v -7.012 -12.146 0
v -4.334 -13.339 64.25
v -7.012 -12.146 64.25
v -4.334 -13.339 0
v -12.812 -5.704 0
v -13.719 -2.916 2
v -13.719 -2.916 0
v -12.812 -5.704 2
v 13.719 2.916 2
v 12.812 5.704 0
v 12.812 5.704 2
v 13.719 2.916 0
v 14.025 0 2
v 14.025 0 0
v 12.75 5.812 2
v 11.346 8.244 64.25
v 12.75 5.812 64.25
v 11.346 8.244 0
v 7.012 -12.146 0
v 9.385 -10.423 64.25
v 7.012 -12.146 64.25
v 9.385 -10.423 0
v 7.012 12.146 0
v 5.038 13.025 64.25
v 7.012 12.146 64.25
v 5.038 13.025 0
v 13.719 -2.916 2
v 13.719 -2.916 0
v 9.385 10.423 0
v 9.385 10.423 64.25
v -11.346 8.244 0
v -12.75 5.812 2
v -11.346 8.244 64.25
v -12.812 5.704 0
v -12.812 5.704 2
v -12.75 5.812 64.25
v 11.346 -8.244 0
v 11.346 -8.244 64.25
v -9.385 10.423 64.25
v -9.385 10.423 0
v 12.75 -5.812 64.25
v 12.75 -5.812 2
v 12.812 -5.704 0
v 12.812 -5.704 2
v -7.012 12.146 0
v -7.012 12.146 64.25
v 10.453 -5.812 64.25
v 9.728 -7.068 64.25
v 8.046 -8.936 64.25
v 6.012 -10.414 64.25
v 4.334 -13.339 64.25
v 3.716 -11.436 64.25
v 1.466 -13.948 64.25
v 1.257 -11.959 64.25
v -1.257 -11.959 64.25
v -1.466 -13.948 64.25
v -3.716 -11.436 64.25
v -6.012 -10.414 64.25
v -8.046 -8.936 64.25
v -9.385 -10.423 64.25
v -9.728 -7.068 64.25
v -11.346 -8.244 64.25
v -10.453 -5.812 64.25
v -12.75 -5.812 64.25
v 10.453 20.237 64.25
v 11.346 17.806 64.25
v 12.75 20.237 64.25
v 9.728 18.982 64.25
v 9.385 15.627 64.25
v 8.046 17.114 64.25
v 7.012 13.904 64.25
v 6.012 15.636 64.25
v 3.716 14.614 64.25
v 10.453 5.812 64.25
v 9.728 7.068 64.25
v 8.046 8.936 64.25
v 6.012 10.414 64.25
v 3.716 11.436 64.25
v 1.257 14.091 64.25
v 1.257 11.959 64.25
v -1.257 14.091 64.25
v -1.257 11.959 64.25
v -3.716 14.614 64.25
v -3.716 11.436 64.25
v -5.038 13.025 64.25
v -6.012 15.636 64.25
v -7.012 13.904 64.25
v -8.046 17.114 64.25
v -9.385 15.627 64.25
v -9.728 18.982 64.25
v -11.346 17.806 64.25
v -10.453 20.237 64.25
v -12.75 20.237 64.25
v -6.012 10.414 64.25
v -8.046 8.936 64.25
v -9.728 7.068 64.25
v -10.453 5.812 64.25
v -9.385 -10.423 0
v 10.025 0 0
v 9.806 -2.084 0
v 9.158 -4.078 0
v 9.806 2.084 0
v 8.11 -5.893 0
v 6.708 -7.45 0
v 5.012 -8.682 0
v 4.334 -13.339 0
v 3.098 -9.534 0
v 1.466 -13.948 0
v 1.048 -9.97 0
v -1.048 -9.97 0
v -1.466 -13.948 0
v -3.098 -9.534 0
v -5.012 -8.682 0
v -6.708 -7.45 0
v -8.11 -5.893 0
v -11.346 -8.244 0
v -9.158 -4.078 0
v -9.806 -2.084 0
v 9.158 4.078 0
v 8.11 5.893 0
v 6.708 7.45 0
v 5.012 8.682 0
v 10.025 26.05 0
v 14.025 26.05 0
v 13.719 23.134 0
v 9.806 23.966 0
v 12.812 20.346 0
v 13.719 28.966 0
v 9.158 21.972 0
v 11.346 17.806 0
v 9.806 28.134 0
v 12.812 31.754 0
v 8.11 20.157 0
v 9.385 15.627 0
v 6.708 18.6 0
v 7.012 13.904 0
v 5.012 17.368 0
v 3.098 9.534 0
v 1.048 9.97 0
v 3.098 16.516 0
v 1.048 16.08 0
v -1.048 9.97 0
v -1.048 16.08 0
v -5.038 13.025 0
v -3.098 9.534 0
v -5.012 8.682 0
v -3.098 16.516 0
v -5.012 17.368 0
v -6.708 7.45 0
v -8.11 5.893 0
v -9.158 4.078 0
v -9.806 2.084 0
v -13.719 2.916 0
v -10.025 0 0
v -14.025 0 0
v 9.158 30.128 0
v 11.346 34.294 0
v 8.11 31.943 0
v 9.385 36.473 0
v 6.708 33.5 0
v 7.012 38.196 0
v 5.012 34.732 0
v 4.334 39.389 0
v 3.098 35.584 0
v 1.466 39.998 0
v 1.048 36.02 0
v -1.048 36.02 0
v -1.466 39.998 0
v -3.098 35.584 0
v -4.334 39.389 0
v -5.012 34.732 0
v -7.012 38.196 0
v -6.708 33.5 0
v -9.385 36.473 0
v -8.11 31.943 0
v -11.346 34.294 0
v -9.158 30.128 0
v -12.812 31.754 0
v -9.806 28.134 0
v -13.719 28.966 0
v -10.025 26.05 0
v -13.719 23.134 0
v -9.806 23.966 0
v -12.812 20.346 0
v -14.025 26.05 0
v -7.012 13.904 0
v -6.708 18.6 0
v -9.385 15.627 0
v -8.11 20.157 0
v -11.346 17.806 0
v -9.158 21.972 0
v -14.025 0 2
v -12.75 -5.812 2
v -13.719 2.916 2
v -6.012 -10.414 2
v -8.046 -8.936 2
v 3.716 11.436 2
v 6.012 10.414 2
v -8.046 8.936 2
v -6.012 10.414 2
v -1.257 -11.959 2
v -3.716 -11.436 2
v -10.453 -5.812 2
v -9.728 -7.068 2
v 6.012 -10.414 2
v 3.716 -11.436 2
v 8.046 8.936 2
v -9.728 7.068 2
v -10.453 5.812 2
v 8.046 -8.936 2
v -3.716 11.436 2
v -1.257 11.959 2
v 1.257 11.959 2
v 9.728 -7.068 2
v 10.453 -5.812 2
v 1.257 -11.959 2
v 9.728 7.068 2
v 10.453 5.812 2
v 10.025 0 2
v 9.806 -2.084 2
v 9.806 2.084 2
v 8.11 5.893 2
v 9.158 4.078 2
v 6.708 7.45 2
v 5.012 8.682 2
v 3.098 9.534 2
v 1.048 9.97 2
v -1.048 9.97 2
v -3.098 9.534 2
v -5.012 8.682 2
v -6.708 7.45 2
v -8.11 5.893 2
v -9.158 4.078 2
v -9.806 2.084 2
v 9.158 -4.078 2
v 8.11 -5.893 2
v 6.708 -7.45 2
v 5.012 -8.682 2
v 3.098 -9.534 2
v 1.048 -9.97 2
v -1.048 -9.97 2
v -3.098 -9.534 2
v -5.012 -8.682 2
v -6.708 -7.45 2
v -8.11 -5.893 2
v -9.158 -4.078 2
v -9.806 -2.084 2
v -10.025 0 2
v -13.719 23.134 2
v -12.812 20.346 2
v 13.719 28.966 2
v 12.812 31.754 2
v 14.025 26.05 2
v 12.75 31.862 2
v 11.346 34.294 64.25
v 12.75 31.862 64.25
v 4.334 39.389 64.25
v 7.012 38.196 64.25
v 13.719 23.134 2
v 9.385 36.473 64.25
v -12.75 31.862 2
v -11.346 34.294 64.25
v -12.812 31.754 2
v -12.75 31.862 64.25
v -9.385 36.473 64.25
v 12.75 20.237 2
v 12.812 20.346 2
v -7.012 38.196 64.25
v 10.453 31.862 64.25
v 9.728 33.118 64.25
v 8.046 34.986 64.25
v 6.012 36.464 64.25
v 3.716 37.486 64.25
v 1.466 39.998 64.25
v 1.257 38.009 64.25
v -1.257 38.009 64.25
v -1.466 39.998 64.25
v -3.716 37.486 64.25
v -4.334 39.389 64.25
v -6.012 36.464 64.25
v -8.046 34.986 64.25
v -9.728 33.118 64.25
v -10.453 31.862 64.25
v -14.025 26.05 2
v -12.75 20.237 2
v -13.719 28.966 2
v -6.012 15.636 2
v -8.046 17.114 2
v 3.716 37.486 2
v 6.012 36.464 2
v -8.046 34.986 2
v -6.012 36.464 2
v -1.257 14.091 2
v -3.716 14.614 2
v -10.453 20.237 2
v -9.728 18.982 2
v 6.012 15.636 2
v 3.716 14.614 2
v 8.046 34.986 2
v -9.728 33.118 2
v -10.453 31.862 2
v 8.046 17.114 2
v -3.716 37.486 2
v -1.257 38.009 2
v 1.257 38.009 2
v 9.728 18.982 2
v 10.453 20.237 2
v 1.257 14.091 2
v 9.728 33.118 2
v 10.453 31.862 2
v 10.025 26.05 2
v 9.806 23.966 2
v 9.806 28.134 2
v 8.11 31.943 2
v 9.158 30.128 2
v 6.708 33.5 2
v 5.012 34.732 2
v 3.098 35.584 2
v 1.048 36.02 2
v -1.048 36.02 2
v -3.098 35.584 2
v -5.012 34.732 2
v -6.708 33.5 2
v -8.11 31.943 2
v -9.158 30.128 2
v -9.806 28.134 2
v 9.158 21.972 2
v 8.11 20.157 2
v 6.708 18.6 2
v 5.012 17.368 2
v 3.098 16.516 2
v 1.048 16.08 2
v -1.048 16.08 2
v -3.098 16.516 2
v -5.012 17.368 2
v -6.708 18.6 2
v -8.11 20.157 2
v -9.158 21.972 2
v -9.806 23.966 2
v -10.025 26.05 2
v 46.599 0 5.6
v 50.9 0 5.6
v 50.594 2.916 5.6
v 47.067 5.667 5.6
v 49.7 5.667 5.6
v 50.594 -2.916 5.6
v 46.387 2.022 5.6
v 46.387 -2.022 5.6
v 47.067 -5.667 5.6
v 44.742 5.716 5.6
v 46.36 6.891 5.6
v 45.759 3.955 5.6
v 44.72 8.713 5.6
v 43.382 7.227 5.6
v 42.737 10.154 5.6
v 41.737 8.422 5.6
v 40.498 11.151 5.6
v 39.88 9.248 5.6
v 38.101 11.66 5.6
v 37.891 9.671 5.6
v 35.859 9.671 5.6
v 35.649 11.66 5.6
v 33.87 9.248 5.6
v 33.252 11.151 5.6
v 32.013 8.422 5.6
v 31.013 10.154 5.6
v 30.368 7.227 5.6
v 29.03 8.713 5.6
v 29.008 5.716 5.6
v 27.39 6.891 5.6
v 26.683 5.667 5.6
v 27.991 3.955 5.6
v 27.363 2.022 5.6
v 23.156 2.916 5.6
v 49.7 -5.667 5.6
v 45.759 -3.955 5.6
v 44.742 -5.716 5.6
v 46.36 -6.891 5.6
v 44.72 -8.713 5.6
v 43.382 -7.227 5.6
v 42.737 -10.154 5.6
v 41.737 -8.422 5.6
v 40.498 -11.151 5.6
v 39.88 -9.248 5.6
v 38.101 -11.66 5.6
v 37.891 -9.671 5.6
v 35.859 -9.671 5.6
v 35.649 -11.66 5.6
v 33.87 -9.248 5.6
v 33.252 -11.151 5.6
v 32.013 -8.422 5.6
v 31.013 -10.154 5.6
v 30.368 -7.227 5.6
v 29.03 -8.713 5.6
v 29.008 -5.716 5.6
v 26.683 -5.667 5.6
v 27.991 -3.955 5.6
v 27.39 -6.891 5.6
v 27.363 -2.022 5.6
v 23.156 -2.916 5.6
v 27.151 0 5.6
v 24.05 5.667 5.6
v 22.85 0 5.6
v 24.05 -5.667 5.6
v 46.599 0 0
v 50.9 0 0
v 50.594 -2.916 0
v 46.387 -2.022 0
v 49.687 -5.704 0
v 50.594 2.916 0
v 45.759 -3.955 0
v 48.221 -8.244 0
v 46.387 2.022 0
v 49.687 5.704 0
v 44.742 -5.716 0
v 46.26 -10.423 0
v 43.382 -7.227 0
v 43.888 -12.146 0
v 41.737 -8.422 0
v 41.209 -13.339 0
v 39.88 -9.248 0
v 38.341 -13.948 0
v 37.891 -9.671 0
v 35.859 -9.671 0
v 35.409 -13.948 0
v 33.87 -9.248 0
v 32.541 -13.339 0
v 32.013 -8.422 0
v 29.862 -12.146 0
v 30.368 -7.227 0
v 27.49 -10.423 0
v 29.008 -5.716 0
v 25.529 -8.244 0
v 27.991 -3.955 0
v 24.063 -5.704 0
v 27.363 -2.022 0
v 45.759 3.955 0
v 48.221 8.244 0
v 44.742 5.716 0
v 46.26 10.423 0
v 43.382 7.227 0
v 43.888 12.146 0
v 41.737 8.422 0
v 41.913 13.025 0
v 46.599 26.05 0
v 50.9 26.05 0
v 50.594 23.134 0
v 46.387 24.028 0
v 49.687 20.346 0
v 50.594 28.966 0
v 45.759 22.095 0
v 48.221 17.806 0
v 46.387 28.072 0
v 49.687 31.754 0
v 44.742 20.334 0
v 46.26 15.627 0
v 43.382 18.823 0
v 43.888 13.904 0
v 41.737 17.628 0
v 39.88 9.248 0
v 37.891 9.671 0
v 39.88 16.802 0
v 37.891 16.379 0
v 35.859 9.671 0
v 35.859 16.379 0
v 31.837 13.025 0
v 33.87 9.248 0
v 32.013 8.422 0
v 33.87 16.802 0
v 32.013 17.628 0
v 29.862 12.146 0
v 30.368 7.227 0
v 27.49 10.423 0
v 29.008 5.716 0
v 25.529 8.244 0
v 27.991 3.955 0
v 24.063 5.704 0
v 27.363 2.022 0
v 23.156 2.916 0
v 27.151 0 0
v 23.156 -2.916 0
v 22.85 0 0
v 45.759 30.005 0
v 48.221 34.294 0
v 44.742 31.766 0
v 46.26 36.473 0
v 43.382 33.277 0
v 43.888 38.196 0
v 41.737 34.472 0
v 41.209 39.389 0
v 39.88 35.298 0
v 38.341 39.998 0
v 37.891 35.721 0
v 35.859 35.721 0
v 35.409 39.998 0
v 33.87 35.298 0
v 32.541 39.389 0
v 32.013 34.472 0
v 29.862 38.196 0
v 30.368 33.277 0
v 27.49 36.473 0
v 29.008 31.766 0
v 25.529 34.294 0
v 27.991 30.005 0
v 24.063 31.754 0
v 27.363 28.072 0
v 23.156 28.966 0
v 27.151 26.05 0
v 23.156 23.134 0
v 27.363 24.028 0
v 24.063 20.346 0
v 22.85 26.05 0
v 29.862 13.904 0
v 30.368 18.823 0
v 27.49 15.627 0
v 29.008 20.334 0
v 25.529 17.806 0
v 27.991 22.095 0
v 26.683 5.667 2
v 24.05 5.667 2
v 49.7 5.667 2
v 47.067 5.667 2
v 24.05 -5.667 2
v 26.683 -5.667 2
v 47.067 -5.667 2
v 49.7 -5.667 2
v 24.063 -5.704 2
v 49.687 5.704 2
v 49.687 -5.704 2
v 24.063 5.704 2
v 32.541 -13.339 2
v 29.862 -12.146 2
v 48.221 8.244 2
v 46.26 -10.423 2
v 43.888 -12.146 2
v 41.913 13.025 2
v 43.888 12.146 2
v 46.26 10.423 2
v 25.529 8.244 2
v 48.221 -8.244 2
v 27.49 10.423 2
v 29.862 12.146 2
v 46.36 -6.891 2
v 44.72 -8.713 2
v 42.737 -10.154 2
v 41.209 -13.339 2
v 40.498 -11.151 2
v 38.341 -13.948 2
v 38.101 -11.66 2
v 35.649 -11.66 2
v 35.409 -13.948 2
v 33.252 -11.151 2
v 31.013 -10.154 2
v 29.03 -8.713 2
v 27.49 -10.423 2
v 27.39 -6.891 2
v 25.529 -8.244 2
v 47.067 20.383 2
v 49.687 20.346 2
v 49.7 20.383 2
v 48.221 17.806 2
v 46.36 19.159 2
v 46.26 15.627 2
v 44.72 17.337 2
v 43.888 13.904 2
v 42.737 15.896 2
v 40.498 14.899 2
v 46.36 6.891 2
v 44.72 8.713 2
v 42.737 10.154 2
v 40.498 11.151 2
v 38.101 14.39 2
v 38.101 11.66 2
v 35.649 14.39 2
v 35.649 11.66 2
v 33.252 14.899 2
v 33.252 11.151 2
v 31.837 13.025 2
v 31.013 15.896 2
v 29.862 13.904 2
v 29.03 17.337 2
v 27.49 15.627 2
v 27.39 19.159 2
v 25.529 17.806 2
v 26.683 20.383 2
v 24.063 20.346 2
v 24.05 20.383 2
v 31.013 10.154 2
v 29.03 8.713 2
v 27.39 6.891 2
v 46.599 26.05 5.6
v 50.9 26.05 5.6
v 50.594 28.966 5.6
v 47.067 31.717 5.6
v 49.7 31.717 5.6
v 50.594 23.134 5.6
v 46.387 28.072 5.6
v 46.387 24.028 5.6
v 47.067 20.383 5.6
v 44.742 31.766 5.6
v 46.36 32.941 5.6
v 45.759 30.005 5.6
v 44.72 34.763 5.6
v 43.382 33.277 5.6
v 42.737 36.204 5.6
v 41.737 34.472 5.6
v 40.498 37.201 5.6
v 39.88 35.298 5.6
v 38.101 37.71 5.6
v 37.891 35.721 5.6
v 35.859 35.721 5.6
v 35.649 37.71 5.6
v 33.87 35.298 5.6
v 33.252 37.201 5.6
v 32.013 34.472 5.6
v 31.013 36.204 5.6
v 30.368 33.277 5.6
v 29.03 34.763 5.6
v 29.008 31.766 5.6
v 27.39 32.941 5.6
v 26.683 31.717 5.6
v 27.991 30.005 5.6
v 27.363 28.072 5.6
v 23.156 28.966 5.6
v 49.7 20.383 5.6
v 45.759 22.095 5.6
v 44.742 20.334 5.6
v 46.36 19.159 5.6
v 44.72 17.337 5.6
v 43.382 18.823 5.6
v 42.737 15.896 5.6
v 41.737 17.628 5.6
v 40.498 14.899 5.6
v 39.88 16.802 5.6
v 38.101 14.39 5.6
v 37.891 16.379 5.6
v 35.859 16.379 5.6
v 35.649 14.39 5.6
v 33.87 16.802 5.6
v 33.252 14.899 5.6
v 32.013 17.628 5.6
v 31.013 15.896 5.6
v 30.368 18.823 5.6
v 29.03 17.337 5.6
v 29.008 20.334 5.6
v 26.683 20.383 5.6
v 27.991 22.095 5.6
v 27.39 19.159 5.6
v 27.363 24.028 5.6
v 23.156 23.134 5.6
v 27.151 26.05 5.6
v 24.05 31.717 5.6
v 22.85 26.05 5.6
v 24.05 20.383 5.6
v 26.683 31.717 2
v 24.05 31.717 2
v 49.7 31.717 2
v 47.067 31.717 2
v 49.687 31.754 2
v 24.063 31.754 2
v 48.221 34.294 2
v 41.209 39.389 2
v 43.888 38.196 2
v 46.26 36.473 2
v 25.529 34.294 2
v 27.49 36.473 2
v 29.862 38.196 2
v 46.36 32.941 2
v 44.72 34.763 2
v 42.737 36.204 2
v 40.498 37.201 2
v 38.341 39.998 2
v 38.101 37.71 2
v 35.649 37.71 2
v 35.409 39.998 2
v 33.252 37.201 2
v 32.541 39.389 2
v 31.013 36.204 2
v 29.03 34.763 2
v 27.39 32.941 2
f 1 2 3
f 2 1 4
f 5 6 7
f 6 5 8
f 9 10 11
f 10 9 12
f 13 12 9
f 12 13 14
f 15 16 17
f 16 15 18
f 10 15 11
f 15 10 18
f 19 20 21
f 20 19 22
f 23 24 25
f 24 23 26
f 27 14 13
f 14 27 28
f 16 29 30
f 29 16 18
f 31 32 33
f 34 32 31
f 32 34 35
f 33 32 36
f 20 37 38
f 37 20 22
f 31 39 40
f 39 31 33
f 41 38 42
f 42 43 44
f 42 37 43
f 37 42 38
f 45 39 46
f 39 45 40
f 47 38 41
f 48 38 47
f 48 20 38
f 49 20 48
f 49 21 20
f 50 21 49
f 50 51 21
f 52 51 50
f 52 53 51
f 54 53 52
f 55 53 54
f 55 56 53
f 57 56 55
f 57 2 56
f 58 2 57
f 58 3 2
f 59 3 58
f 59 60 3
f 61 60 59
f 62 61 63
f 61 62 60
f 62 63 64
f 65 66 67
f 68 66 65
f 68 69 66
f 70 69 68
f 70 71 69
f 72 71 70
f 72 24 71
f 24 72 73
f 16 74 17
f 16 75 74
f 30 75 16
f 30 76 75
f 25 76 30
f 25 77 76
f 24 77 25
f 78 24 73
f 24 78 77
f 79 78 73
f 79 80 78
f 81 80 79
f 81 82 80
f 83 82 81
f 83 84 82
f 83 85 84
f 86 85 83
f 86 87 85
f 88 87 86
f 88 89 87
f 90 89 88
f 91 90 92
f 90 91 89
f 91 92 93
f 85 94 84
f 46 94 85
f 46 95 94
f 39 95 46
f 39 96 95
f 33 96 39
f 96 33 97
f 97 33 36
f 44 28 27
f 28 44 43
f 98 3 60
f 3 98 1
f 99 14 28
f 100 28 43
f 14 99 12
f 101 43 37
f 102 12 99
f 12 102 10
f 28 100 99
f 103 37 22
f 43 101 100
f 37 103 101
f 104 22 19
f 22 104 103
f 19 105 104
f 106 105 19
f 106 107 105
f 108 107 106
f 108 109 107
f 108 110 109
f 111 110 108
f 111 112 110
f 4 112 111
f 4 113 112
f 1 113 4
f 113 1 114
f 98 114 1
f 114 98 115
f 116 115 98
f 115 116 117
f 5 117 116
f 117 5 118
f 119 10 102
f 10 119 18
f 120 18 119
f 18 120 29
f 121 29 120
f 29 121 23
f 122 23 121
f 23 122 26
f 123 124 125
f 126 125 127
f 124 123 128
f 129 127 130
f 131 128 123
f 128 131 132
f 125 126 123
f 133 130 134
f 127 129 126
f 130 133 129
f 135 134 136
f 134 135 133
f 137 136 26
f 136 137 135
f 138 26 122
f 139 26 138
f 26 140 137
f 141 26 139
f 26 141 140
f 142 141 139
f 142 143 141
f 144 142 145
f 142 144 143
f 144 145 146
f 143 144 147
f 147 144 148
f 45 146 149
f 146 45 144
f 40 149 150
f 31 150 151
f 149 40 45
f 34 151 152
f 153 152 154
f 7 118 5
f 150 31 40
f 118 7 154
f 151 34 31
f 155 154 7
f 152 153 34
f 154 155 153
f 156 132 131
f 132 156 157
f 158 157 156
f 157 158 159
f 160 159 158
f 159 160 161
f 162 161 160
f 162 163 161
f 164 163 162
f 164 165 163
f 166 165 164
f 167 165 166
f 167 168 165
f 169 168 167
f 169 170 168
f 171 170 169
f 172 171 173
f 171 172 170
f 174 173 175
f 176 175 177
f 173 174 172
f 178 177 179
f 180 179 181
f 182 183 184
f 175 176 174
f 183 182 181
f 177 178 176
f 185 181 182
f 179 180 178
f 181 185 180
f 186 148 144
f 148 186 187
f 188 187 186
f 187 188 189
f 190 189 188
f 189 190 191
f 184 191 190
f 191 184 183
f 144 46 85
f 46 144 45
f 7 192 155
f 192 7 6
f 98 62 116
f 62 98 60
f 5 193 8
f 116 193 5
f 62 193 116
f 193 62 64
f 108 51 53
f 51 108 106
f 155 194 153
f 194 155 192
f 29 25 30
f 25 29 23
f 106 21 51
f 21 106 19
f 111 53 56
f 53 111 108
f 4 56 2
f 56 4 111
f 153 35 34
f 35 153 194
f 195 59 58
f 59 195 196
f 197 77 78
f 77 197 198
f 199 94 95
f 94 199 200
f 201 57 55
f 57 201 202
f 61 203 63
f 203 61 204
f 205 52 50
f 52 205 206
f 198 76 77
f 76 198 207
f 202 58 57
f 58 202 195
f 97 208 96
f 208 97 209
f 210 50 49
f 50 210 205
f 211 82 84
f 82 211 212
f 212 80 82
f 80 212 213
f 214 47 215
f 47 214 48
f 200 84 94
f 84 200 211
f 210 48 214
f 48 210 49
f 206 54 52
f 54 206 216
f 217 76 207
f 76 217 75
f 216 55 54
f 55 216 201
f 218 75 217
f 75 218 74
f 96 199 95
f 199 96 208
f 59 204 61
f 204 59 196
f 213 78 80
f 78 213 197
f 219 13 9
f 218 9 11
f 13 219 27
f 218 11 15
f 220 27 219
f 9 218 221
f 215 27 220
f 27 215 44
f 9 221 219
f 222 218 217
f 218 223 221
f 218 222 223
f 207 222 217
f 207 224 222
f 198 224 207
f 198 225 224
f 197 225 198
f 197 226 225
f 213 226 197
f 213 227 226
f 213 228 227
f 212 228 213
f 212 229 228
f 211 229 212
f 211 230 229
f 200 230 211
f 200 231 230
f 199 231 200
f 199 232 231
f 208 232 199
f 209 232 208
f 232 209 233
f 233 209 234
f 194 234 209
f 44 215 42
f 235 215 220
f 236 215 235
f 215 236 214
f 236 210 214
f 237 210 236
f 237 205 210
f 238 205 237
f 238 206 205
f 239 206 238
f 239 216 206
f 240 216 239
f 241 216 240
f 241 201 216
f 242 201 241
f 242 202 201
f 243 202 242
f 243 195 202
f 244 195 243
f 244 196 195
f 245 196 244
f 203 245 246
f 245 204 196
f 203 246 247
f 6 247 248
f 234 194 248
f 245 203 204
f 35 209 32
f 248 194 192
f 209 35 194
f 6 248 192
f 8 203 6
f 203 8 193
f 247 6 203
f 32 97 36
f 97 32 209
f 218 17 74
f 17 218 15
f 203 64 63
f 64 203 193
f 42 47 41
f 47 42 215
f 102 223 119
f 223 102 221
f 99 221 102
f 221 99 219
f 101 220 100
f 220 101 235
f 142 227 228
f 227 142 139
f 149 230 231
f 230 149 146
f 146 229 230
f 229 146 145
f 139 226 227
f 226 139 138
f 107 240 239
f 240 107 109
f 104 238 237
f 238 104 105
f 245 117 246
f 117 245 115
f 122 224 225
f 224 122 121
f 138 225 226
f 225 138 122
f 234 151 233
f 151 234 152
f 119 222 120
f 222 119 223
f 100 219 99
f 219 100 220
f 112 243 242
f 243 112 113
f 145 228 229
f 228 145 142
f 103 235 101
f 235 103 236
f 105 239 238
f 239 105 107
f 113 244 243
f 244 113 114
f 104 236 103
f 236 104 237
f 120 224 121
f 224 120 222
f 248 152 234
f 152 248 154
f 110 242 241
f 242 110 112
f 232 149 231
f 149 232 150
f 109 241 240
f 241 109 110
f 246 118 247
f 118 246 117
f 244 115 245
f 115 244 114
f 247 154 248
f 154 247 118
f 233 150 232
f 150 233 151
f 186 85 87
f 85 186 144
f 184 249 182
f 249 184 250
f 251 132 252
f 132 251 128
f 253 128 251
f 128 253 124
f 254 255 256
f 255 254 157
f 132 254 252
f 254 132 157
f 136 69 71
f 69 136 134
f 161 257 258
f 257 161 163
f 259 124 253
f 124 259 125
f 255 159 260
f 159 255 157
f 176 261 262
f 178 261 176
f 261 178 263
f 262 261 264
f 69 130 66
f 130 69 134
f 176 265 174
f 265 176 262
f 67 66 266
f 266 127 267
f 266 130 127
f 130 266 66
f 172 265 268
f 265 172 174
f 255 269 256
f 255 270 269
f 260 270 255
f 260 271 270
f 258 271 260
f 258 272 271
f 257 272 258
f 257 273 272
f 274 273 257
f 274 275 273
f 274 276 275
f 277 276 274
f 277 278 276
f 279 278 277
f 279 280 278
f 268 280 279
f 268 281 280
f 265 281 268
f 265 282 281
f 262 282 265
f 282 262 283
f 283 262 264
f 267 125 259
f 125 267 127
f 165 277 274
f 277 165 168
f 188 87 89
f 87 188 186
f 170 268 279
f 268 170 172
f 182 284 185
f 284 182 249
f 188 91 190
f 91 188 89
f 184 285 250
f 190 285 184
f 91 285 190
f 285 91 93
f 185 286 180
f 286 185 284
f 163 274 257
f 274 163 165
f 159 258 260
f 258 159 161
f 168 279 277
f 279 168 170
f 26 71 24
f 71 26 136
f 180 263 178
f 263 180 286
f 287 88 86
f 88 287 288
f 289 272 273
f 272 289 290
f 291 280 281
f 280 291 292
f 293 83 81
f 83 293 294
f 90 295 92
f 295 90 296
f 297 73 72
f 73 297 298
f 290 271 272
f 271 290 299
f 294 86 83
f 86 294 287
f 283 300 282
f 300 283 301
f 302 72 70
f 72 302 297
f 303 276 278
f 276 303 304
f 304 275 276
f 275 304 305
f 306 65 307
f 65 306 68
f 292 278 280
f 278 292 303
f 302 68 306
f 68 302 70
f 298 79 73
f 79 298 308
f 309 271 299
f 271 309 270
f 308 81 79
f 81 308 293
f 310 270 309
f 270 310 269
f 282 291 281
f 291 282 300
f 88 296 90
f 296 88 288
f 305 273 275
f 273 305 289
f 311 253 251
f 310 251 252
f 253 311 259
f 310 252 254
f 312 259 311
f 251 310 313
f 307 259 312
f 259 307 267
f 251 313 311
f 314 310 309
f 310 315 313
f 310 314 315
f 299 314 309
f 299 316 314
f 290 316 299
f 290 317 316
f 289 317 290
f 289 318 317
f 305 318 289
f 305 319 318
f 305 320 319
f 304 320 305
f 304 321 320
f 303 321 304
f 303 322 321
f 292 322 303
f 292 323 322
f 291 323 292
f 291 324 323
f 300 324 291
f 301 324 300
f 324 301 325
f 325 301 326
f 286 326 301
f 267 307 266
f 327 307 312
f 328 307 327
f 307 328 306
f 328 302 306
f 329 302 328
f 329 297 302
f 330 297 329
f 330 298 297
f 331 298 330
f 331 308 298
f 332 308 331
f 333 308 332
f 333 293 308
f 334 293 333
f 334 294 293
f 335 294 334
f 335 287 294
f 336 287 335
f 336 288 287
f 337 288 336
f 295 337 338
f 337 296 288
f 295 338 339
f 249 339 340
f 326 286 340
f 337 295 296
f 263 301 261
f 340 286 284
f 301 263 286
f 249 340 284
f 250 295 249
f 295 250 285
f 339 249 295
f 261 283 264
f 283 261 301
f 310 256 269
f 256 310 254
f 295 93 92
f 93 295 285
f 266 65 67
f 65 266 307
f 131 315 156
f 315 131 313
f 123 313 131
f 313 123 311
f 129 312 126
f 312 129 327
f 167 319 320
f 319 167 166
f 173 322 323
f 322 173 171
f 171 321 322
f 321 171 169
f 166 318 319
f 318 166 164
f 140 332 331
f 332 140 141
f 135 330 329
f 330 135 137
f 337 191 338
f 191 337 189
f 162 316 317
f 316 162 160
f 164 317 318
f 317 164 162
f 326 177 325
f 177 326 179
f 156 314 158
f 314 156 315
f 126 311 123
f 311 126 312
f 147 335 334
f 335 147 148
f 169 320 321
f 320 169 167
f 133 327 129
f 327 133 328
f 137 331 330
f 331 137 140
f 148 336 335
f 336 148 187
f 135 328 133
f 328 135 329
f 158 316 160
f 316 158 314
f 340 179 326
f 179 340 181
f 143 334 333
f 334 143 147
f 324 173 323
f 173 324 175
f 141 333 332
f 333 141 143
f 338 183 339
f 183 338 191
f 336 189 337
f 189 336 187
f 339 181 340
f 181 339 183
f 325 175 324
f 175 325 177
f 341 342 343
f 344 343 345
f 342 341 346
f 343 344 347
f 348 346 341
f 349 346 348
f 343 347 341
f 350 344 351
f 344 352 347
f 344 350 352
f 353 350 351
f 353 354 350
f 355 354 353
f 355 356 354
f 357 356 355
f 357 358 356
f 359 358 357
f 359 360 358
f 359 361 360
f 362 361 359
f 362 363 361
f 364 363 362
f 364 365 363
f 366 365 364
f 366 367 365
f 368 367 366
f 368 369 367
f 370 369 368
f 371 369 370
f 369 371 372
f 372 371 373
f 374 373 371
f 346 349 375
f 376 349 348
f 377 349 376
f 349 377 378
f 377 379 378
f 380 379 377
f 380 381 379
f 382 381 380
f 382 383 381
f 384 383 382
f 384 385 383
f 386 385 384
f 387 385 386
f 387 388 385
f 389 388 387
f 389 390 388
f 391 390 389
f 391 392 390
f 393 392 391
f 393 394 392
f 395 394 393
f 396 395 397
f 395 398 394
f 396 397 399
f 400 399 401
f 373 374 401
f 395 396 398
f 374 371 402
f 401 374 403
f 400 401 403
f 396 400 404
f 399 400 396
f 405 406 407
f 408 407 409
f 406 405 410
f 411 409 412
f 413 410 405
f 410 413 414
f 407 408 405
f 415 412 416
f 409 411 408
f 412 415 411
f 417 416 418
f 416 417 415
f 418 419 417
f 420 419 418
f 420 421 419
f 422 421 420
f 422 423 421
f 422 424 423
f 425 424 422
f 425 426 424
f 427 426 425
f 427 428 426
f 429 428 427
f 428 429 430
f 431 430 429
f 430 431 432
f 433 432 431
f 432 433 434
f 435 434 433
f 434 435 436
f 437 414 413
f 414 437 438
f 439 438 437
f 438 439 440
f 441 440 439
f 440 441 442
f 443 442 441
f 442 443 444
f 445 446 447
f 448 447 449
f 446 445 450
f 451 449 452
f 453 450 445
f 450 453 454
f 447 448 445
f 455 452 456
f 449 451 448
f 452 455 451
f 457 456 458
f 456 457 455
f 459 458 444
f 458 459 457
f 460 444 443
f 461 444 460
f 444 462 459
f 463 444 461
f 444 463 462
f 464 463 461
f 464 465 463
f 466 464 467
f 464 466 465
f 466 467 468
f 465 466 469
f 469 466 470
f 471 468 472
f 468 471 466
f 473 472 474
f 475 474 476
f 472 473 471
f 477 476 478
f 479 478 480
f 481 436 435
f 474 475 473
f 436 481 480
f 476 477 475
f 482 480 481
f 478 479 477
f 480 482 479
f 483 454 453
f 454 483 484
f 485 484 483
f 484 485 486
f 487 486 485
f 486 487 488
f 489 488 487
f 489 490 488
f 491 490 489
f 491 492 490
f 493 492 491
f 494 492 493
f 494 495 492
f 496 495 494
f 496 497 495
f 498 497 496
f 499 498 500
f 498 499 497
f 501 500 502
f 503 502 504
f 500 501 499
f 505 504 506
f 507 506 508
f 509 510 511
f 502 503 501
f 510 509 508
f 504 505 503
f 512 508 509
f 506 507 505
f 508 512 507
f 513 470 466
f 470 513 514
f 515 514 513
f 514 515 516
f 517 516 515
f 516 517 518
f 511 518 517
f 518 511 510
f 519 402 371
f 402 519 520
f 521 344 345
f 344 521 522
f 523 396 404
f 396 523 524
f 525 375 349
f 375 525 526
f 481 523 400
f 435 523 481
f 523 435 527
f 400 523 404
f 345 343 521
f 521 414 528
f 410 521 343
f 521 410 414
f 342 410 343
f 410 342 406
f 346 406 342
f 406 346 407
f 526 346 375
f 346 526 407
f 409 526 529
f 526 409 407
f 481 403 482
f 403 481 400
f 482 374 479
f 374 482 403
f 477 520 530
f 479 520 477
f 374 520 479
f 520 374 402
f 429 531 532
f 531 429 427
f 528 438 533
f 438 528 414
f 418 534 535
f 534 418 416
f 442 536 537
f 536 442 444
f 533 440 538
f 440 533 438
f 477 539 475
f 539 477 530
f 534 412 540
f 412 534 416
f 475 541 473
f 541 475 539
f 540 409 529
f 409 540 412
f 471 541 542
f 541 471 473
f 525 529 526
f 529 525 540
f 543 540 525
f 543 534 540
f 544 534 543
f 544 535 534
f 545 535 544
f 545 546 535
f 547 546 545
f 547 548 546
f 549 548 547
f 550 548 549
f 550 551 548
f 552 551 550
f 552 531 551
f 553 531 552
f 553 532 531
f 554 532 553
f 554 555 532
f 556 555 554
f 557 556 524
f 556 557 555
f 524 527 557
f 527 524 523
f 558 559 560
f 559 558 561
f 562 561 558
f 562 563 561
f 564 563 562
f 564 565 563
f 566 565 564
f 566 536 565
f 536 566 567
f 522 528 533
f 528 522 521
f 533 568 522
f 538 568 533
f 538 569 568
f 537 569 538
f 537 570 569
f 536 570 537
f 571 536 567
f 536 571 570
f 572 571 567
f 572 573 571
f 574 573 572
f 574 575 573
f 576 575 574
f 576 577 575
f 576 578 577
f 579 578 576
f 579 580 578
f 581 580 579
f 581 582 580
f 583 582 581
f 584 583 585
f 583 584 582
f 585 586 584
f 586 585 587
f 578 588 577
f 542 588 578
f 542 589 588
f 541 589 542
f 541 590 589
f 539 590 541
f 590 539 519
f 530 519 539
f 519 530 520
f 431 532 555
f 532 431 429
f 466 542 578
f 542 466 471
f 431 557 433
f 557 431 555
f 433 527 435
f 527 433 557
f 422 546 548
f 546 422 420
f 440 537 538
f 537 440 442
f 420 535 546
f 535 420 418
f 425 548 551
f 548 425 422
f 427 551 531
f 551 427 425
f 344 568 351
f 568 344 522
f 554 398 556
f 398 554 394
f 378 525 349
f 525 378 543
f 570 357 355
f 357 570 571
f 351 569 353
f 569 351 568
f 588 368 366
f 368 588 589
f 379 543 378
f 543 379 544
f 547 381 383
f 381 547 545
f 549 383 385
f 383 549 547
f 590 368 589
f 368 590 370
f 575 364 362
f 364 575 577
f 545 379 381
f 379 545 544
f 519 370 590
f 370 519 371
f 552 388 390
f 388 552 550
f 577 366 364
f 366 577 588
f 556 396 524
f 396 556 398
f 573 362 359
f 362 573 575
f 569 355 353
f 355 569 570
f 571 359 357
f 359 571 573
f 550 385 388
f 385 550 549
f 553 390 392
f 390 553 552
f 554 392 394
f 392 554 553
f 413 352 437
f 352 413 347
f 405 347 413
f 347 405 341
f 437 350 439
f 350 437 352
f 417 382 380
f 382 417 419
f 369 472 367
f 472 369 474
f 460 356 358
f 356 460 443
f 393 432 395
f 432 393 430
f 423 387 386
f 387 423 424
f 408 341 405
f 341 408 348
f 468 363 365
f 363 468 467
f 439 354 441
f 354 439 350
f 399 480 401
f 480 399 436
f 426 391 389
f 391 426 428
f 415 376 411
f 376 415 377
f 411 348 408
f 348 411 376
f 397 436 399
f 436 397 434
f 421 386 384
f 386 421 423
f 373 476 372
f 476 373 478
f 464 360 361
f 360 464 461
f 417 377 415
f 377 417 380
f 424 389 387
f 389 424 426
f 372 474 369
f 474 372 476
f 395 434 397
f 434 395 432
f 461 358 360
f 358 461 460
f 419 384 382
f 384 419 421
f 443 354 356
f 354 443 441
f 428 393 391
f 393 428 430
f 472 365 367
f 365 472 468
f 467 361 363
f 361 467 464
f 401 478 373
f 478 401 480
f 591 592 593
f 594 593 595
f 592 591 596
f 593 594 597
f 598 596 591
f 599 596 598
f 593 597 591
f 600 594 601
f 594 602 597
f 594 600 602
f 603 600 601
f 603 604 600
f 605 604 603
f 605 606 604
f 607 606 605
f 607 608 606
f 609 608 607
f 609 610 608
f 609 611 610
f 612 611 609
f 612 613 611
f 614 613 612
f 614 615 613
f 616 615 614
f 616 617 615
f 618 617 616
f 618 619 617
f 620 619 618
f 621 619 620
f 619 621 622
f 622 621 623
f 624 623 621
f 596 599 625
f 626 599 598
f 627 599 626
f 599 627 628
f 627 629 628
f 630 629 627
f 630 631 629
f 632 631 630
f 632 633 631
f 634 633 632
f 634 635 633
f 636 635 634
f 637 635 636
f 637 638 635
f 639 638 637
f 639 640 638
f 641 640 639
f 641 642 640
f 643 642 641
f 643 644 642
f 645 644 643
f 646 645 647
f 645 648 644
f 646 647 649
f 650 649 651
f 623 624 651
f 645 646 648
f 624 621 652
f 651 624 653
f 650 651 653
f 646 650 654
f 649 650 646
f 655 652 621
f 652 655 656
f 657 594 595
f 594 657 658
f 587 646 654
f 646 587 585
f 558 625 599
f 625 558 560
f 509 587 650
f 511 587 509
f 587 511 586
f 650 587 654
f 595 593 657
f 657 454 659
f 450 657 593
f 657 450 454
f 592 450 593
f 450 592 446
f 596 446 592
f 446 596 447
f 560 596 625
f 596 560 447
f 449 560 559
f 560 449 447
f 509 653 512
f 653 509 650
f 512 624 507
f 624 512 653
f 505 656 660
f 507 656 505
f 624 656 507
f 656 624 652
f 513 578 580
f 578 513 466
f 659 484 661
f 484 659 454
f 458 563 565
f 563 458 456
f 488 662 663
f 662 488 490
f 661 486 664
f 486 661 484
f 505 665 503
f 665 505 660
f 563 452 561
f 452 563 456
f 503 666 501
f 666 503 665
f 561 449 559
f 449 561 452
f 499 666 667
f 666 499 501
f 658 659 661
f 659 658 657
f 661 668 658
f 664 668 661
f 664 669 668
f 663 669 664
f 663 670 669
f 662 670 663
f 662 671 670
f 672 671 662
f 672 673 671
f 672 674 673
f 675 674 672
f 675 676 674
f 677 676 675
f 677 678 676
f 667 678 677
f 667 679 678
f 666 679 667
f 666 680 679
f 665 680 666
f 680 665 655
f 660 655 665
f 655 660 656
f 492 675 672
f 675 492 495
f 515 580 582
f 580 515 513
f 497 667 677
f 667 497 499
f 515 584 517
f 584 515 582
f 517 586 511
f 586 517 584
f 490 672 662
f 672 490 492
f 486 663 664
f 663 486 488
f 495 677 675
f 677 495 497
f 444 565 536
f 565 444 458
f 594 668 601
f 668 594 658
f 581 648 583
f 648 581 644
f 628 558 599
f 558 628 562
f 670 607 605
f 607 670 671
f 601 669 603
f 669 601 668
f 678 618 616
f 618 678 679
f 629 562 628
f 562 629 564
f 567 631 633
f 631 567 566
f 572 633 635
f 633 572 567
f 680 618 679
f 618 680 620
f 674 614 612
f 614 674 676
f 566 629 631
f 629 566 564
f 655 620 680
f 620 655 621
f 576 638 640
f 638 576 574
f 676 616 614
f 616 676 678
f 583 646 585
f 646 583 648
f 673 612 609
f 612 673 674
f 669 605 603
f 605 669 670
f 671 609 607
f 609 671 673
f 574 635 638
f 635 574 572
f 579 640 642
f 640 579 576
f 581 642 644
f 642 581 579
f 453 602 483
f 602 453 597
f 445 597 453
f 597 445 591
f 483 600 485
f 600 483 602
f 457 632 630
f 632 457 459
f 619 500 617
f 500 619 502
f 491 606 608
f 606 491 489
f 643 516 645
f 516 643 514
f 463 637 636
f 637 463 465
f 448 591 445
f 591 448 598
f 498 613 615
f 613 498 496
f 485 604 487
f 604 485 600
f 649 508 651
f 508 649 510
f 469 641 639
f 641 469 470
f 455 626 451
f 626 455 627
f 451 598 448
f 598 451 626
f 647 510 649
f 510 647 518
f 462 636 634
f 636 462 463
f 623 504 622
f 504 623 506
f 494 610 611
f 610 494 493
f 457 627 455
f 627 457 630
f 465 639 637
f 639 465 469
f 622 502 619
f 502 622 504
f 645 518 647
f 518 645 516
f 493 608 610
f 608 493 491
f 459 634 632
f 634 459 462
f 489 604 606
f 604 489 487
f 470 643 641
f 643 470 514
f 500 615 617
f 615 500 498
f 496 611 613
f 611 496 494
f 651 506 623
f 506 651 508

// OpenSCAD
/*
 * PARAMETRIC COIN TUBES + CAP
 * VERSION 1.3.1
 * last update: 02/12/13
 * design by newq 
 * mod kitwallace (thanks!)
 */

// 
// the generated tubes insides are 2 coins higher than the number of coins they fit

coin_type = 0; // [ 0:1 Euro, 1:2 Euro, 2:50 Euro cents,  3:20 Euro cents, 4:10 Euro cents, 5:5 Euro cents, 6:2 Euro cent, 7: 1 Euro cent, 8: 1 US Dollar, 9: 0.50 US Dollar, 10: 0.25 US Dollar, 11: 0.10 US Dollar, 12: 0.05 US Dollar, 13: 0.01 US Dollar, 14: 2 Canadian Dollar, 15: 1 Canadian Dollar, 16: 0.50 Canadian Dollar, 17: 0.25 Canadian Dollar, 18: 0.10 Canadian Dollar, 19: 0.05 Canadian Dollar, 20: 0.01 Canadian Dollar, 21: 0.50 Mexican Pesos, 22: 1 Mexican Pesos, 23: 2 Mexican Pesos, 24: 5 Mexican Pesos, 25: 10 Mexican Pesos, 26: 20 Mexican Pesos, 27: 100 Mexican Pesos]

// how many stacked coins should fit in a tube
number_of_coins = 25; 
number_of_tubes = 2; 

// Do you want to print the tubes?
generate_tube = 1; // [1:Yes, 0:No] 
// Do you want a cap to close the tube?
generate_cap = 1; // [1:Yes, 0:No] 
// thickness of wall and bottom (mm)
tube_wall = 2;  
// clearance from coin to wall of tube (mm) 
clearance = 0.4;
// if the cap fits too tight you might decrease slightly
fudge_factor = 0.975; 

// NOTHING TO SEE HERE :)

// coin data - name, diameter, height
coins = [ 
              ["1 Euro", 23.25, 2.33], 
              ["2 Euro", 25.75, 2.20],
              ["50 Euro cents", 24.25, 2.38],
              ["20 Euro cents", 22.25, 2.14],
              ["10 Euro cents", 19.75, 1.93],
              ["5 Euro cents", 21.25, 1.67],
              ["2 Euro cents", 18.75, 1.67],
              ["1 Euro cents", 16.25, 1.67],
              ["1 US Dollar", 26.50, 2.00],
              ["0.50 US Dollar", 30.61, 2.15],
              ["0.25 US Dollar", 24.26, 1.75],
              ["0.10 US Dollar", 17.91, 1.35],
              ["0.05 US Dollar", 21.21, 1.95],
              ["0.01 US Dollar", 19.05, 1.55],
              ["2 Canadian Dollar", 28.00, 1.80],
              ["1 Canadian Dollar", 26.50, 1.75],
              ["0.50 Canadian Dollar", 27.13, 1.95],
              ["0.25 Canadian Dollar", 23.88, 1.58],
              ["0.10 Canadian Dollar", 18.03, 1.22],
              ["0.05 Canadian Dollar", 21.2, 1.76],
              ["0.01 Canadian Dollar", 19.05, 1.45],
				  ["0.50 Mexican Pesos", 17.00, 2.10],
				  ["1 Mexican Pesos", 21.13, 1.75],
				  ["2 Mexican Pesos", 23.08, 1.75],
				  ["5 Mexican Pesos", 25.53, 2.03],
				  ["10 Mexican Pesos", 28.00, 2.25],
				  ["20 Mexican Pesos", 32.00, 2.60],
				  ["100 Mexican Pesos", 39.09, 3.65],
            ];

coin_diameter = coins[coin_type][1];
coin_height = coins[coin_type][2];

// generating the tubes
if (generate_tube) {
  assign(cyl_inner_h = (coin_height * number_of_coins) + (4 * tube_wall),
             cyl_inner_r = (coin_diameter / 2) + clearance,

             cyl_outer_h = (coin_height * number_of_coins) + (3 * tube_wall),
             cyl_outer_r = (coin_diameter / 2) + tube_wall + clearance,

             cutout_x = coin_diameter + (4 * tube_wall),
             cutout_y = (coin_diameter / 2),
             cutout_z = (coin_height * number_of_coins) + (3 * tube_wall)
             )


  for (z = [0 : (number_of_tubes-1)]){

	translate (v = [0, z * (cyl_outer_r * 2 - tube_wall), 0]){
		difference(){	
			difference(){
				difference() {
					// outer tube
					cylinder(h = cyl_outer_h, r = cyl_outer_r);
					// inner tube
					translate(v = [0, 0, tube_wall]) {
						cylinder(h = cyl_inner_h, r = cyl_inner_r);
					}
				}
				// round bottom cutout
				translate (v = [0, 0, ((cutout_z / 2) + tube_wall)]){
					cube(size = [cutout_x, cutout_y, cutout_z], center = true);
				}
			}
			// cutout
			translate (v = [0, 0, -tube_wall]){
				cylinder(h = (cyl_inner_h + tube_wall), r = (cyl_inner_r - tube_wall));
			}
		}
   }
}

}

// generating the tube tops

if (generate_cap) {
   assign (cyl_inner_h = 3*tube_wall - clearance,
               cyl_inner_r = ((coin_diameter / 2) + clearance) * fudge_factor,

               cyl_outer_h = tube_wall,
               cyl_outer_r = (coin_diameter / 2) + tube_wall + clearance,

               cutout_x = coin_diameter + (4 * tube_wall),
               cutout_y = (coin_diameter / 2) * fudge_factor,
               cutout_z = 3*tube_wall - clearance
             )
    translate([1.5 * coin_diameter + tube_wall, 0, 0]){
	for (z = [0 : (number_of_tubes-1)]){
		
		translate (v = [0, z * (cyl_outer_r * 2 - tube_wall), 0]){
			difference(){
				union(){		
					cylinder(h = cyl_outer_h, r = cyl_outer_r);
					cylinder(h = cyl_inner_h, r = cyl_inner_r);
				
					intersection(){
						translate([0,0,cutout_z/2]){
							cube(size = [cutout_x, cutout_y, cutout_z], center = true);
						}
						cylinder(h = cyl_outer_h+10, r = cyl_outer_r);
					}
				}
				
				translate([0,0,-(cyl_inner_h /2)]){
					cylinder(h = cyl_inner_h *2, r = cyl_inner_r - tube_wall);
				}			
			}		
		}
	}	
}
}
